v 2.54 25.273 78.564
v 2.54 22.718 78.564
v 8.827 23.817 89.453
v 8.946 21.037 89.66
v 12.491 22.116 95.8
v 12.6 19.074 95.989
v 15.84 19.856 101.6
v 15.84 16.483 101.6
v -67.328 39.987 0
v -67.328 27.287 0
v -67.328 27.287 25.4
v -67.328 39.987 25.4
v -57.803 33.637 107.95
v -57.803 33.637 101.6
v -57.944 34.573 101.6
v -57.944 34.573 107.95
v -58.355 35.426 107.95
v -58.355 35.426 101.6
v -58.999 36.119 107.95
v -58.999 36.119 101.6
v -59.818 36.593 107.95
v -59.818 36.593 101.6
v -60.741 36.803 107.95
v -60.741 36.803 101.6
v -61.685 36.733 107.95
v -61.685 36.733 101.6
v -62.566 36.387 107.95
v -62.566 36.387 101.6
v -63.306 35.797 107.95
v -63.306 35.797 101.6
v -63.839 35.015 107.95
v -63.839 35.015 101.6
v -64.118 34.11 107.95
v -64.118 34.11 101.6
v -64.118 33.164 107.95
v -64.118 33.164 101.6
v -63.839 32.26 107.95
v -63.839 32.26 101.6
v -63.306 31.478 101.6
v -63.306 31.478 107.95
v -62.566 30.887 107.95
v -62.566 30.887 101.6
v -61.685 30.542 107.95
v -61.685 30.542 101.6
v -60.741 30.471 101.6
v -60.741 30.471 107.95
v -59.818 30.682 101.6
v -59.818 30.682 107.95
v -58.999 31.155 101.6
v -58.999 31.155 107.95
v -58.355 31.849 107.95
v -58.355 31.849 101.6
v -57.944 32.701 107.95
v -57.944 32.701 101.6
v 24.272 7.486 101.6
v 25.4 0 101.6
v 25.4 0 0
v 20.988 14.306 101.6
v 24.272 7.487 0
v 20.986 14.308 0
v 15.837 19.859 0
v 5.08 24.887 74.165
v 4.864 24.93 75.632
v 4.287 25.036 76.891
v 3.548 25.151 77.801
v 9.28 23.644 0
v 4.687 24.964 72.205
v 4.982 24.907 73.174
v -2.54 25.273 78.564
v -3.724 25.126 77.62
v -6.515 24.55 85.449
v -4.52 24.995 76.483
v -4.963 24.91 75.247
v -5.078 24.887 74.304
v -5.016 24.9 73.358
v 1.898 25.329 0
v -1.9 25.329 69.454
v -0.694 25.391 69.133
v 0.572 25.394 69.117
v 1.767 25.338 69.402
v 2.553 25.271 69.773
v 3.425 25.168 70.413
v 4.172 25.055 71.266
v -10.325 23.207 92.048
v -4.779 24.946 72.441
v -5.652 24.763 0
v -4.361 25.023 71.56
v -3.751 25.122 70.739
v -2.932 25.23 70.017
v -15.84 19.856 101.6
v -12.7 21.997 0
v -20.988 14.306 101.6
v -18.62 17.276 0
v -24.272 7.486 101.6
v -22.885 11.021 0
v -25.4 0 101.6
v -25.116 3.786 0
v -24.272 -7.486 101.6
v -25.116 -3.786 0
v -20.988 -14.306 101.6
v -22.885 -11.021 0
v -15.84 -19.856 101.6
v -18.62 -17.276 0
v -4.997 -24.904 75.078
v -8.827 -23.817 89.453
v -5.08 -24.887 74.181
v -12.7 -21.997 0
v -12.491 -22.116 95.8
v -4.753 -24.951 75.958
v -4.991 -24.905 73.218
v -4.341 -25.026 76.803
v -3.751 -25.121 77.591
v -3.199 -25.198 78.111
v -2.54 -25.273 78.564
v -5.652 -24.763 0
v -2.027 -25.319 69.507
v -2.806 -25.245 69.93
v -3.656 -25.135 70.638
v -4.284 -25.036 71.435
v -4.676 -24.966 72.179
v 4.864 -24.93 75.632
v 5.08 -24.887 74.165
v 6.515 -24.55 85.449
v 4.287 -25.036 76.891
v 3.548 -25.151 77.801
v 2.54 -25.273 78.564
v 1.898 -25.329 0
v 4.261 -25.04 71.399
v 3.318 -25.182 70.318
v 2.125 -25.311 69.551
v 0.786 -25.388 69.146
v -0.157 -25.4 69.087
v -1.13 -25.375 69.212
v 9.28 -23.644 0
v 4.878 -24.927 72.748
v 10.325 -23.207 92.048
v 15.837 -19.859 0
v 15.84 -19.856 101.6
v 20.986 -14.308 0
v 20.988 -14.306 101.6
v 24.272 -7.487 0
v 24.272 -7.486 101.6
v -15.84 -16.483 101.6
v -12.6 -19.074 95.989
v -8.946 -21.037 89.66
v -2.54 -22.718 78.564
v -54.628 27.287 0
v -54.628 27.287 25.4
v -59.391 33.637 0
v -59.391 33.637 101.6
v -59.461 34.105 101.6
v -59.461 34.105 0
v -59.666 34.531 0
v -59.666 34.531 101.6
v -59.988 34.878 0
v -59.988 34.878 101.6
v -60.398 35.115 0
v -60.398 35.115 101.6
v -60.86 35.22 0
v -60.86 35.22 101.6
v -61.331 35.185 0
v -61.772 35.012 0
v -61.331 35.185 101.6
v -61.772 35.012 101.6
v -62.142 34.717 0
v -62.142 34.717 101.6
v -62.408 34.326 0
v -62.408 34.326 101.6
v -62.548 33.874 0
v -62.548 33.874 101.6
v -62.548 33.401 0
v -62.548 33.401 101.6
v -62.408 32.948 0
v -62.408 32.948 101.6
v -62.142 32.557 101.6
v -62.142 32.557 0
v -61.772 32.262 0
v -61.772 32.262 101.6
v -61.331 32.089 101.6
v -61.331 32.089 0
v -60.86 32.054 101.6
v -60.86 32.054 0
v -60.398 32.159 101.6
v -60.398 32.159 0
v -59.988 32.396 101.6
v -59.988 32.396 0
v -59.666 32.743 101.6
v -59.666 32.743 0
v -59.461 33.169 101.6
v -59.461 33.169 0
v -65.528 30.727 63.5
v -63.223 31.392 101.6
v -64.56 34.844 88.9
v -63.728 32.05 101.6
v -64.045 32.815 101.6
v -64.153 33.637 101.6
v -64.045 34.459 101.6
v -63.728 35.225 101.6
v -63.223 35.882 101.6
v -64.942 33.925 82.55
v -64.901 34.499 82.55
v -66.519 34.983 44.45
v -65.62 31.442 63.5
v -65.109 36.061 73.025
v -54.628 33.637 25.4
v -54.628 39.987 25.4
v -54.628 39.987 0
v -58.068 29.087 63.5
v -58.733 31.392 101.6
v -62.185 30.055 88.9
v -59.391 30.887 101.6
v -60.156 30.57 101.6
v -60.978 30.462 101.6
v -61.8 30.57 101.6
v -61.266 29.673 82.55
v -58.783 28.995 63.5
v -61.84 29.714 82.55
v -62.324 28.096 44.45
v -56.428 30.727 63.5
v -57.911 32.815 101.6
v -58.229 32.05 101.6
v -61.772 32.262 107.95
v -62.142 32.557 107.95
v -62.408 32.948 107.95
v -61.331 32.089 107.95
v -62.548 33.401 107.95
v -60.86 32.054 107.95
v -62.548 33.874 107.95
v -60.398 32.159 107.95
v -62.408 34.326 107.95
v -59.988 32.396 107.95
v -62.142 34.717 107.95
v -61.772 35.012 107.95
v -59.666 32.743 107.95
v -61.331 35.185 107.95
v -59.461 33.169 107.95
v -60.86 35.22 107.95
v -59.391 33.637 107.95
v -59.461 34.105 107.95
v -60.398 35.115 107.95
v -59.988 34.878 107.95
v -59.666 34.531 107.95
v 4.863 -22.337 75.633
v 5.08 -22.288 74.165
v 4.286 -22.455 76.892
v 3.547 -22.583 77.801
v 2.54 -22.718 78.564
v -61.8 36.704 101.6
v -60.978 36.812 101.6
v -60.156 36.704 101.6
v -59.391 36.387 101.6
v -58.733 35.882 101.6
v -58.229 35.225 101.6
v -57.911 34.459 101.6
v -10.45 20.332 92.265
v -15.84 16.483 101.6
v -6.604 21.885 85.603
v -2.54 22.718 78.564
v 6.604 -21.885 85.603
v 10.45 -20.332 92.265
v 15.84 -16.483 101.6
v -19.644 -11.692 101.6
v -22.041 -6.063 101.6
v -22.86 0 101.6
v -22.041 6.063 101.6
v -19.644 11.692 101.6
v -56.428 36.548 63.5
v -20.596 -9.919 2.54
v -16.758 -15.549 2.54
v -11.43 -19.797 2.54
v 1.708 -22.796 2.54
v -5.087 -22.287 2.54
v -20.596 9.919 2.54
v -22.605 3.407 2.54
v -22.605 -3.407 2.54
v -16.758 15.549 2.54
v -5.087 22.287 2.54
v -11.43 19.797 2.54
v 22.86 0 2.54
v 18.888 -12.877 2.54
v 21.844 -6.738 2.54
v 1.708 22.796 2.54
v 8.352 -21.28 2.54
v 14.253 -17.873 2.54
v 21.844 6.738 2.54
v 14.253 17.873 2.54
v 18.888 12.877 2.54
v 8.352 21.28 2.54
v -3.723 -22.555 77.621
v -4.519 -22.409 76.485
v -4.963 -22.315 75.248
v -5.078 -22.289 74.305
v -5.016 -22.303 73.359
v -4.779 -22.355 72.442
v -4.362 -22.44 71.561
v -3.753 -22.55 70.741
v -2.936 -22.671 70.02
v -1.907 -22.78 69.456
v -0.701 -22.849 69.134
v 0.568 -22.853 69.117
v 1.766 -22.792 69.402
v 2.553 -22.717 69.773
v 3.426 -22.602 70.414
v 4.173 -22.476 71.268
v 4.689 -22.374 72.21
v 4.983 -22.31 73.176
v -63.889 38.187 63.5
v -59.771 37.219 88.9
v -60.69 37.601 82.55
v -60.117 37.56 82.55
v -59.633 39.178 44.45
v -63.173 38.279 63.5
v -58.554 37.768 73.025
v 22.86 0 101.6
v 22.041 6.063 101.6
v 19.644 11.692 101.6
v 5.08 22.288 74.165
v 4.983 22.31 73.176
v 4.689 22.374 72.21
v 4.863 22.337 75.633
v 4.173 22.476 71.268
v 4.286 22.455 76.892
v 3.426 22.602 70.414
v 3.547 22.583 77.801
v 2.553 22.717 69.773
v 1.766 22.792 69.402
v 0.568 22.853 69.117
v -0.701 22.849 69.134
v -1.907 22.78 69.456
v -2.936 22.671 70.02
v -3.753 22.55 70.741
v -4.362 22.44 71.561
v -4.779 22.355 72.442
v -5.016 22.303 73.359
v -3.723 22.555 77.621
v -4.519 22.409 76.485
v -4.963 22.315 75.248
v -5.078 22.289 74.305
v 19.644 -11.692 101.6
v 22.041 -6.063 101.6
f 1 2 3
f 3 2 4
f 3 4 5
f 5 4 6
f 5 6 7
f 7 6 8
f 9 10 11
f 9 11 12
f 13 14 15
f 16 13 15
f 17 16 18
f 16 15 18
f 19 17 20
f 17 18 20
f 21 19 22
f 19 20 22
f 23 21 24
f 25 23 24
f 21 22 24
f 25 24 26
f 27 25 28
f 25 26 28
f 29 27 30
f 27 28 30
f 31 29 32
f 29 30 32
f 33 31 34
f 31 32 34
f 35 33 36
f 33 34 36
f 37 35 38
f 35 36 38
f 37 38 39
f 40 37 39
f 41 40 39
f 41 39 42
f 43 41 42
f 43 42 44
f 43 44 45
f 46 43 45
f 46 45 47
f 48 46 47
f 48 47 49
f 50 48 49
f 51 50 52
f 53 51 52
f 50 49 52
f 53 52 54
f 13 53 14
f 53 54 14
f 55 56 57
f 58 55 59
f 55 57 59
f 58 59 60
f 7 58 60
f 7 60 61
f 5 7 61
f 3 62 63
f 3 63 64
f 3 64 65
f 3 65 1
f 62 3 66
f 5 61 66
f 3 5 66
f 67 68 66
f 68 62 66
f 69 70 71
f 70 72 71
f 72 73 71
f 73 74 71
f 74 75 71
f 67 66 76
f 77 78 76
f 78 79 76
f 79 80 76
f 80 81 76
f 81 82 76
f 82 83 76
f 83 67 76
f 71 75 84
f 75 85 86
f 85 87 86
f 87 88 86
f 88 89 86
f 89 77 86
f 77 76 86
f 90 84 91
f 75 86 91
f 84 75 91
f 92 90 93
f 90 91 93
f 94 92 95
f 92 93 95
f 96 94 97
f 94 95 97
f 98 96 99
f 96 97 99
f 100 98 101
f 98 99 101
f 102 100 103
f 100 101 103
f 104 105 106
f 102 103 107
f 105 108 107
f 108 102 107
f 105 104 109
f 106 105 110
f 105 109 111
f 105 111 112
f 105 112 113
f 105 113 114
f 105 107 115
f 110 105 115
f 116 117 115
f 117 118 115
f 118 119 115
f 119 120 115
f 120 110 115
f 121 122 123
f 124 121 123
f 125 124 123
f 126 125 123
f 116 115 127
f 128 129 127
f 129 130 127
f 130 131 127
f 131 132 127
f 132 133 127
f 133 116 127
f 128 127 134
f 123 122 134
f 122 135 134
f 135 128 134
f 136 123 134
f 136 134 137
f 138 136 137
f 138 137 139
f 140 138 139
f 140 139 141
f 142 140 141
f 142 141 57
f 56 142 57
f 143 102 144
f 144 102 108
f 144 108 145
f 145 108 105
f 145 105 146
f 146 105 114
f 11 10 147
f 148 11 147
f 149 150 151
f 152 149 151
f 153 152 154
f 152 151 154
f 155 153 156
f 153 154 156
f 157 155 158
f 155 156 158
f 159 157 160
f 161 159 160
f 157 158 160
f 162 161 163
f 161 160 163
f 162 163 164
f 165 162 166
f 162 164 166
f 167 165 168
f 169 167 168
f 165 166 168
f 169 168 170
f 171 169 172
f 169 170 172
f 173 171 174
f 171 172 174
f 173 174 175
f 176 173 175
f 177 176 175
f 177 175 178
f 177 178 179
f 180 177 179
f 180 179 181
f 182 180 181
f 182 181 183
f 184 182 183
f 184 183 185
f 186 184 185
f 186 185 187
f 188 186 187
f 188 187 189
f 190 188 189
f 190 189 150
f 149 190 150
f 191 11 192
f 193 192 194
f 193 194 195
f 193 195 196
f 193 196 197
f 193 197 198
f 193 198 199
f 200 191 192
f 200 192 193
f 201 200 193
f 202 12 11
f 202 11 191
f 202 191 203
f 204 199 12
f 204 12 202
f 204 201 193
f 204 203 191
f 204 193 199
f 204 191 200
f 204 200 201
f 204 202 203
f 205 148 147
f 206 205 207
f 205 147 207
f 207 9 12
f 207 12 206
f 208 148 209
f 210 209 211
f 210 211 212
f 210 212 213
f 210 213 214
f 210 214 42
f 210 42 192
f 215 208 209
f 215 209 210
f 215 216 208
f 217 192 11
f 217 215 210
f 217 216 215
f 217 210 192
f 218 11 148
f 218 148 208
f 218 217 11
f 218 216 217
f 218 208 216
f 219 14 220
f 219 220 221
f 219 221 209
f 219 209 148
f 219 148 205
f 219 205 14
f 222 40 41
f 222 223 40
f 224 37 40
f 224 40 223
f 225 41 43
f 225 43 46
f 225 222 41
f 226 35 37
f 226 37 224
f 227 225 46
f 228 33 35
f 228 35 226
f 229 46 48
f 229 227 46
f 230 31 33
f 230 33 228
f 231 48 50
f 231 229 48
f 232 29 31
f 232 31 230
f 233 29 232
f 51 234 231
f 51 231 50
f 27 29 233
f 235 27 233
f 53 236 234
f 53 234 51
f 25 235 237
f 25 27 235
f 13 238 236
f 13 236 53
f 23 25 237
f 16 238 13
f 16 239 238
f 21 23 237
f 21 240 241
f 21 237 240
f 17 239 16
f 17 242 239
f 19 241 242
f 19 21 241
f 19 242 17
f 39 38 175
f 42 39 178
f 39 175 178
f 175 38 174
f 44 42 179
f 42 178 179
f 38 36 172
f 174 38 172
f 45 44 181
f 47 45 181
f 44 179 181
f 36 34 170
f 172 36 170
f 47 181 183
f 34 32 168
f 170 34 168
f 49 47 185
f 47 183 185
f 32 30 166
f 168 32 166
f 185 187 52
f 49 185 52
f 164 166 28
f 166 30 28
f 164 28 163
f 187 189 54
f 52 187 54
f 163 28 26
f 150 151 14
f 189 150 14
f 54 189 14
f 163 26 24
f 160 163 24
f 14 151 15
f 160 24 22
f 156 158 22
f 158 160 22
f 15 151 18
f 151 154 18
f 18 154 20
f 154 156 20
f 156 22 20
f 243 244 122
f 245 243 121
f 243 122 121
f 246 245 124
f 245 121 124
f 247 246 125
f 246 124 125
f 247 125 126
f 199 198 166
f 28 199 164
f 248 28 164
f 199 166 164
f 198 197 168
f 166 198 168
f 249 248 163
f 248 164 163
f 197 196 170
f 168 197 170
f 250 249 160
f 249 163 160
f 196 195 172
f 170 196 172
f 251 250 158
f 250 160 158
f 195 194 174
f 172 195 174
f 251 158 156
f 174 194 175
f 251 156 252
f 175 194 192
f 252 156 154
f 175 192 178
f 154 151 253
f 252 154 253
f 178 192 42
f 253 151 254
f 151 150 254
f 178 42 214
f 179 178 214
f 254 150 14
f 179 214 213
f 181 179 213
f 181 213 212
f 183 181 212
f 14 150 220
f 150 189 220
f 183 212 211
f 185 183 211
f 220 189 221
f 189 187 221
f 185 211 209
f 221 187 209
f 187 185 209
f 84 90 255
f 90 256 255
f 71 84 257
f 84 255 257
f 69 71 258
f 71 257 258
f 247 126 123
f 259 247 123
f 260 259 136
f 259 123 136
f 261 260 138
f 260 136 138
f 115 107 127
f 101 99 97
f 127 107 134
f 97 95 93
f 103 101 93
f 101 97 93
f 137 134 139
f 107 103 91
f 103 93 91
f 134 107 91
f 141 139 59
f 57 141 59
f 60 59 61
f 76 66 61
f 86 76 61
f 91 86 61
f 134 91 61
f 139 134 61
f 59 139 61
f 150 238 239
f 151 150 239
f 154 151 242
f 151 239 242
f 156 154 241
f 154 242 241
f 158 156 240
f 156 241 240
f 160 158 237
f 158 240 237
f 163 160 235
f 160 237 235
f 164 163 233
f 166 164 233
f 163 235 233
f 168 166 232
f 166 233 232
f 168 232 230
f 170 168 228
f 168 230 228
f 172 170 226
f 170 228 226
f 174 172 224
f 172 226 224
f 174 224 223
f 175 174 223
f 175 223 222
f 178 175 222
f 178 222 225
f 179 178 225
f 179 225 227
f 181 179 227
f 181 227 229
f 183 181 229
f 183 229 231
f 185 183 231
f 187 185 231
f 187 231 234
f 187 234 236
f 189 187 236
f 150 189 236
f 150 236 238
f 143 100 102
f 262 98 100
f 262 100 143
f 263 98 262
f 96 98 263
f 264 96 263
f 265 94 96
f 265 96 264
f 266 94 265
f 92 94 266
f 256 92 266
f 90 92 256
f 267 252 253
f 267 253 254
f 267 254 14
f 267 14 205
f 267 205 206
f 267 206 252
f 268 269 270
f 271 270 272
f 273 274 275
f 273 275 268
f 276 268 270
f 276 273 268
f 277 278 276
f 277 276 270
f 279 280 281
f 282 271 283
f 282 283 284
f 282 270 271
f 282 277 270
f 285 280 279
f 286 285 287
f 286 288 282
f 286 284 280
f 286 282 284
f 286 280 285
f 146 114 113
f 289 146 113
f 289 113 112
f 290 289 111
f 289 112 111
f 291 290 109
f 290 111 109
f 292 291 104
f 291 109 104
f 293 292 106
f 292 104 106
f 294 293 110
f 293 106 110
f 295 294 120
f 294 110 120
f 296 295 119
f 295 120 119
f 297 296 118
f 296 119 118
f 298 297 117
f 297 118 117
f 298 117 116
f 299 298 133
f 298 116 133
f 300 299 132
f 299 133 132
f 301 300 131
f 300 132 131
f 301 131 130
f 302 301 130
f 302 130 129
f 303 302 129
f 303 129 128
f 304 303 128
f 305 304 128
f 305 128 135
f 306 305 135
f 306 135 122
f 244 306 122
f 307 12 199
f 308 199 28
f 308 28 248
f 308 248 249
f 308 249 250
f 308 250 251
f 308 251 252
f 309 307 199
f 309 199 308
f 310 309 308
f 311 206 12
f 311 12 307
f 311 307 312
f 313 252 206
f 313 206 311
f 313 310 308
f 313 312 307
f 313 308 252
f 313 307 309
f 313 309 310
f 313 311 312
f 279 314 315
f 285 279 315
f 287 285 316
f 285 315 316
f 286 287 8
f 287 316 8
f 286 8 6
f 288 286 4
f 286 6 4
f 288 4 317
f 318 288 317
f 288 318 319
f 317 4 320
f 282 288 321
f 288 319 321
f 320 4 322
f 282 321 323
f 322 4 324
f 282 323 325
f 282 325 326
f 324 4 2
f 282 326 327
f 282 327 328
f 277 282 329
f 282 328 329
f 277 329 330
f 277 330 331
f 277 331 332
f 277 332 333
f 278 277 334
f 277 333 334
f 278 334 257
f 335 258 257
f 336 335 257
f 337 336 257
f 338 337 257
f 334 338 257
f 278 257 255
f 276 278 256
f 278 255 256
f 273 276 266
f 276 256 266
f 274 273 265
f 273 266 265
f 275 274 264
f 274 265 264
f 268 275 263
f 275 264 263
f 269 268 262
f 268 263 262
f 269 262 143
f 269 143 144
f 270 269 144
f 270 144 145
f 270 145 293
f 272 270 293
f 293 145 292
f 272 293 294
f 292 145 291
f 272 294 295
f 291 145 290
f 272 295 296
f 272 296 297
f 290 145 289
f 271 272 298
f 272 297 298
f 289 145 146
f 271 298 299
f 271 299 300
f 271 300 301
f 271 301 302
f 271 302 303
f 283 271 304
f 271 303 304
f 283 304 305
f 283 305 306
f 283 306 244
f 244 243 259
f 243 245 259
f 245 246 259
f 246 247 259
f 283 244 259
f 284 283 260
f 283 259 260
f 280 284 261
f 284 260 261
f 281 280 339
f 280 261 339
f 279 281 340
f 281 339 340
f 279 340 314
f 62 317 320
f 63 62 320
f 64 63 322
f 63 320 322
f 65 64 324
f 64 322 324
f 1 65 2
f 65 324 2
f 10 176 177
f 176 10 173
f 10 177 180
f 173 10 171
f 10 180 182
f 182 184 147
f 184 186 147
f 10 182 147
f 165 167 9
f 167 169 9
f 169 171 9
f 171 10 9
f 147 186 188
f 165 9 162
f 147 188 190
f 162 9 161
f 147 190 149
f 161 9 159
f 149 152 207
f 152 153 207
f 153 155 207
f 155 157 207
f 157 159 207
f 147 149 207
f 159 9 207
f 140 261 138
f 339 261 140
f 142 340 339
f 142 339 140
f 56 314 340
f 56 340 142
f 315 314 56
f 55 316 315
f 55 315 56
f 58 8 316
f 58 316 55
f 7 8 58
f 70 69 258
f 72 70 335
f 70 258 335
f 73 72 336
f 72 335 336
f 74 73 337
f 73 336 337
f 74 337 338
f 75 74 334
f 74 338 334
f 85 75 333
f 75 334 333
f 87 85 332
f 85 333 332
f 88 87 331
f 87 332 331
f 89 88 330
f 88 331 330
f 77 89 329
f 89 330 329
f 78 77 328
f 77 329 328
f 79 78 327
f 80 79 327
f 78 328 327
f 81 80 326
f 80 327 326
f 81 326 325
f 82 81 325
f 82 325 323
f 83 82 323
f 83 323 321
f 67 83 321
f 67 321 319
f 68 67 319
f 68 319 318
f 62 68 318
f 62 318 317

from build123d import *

# Parameters (mm, degrees)
F0_R      = 25.4
F1_DEPTH  = 101.6
F2_R      = 22.86
F3_DEPTH  = 99.06
F6_DEPTH  = 50.8
F0_W      = 12.7
F0_H      = 12.7
F7_DEPTH  = 25.4
F8_R      = 3.175
F9_DEPTH  = 6.35
F9_FACE_R = 3.175
F7_FACE_W = 12.7
F7_FACE_H = 12.7
F11_R     = 1.5875
F12_DEPTH = 130.048


with BuildPart() as f1:
    # F0 (on Top) → F1 (new body)
    with BuildSketch(Plane.XY):
        Circle(F0_R)
    extrude(amount=F1_DEPTH)

    # F2 (on face) → F3 (cut)
    with BuildSketch(Plane.XY.offset(101.6)):
        Circle(F2_R)
    extrude(amount=-F3_DEPTH, mode=Mode.SUBTRACT)

    # F5 (on offset) → F6 (cut)
    with BuildSketch(Plane.XZ.offset(25.4)):
        with BuildLine():
            Line((17.1430092305, 103.8575321436), (-17.1430092305, 103.8575321436))
            Line((-17.1430092305, 103.8575321436), (-2.54, 78.564378213))
            ThreePointArc((-2.54, 78.564378213), (0, 79.2449691618), (2.54, 78.564378213))
            Line((2.54, 78.564378213), (17.1430092305, 103.8575321436))
        make_face()
        with BuildLine():
            ThreePointArc((2.54, 78.564378213), (0, 79.2449691618), (-2.54, 78.564378213))
            Line((-2.54, 78.564378213), (0, 74.1649691618))
            Line((0, 74.1649691618), (2.54, 78.564378213))
        make_face()
        with BuildLine():
            Line((0, 74.1649691618), (-2.54, 78.564378213))
            ThreePointArc((-2.54, 78.564378213), (-2.54, 69.7655601105), (5.08, 74.1649691618))
            ThreePointArc((5.08, 74.1649691618), (4.3994090512, 76.7049691618), (2.54, 78.564378213))
            Line((2.54, 78.564378213), (0, 74.1649691618))
        make_face()
    extrude(amount=-F6_DEPTH, mode=Mode.SUBTRACT)


with BuildPart() as f7:
    # F0 (on Top) → F7 (new body)
    with BuildSketch(Plane.XY):
        with Locations((-60.9781401396, 33.637106961)):
            Rectangle(F0_W, F0_H)
    extrude(amount=F7_DEPTH)

    # F9_face (on face) → F10 section 0
    with BuildSketch(Plane(origin=(-60.9781401396, 33.637106961, 101.6), x_dir=(1, 0, 0), z_dir=(0, 0, -1))):
        Circle(F9_FACE_R)
    # F7_face (on face) → F10 section 1
    with BuildSketch(Plane(origin=(-60.9781401396, 33.637106961, 25.4), x_dir=(1, 0, 0), z_dir=(0, 0, 1))):
        Rectangle(F7_FACE_W, F7_FACE_H)
    loft()


with BuildPart() as f9:
    # F8 (on face) → F9 (new body)
    with BuildSketch(Plane.XY.offset(101.6)):
        with Locations((-60.9781401396, 33.637106961)):
            Circle(F8_R)
    extrude(amount=F9_DEPTH)


with BuildPart() as f12_tool:
    # F11 (on face) → F12 (new body)
    with BuildSketch(Plane.XY.offset(107.95)):
        with Locations((-60.9781401396, 33.637106961)):
            Circle(F11_R)
    extrude(amount=-F12_DEPTH)


with BuildPart() as f7_1:
    add(f7.part)

    # F12: cut by f12_tool
    add(f12_tool.part, mode=Mode.SUBTRACT)


with BuildPart() as f9_1:
    add(f9.part)

    # F12: cut by f12_tool
    add(f12_tool.part, mode=Mode.SUBTRACT)


solid = Compound([f1.part, f7_1.part, f9_1.part])
